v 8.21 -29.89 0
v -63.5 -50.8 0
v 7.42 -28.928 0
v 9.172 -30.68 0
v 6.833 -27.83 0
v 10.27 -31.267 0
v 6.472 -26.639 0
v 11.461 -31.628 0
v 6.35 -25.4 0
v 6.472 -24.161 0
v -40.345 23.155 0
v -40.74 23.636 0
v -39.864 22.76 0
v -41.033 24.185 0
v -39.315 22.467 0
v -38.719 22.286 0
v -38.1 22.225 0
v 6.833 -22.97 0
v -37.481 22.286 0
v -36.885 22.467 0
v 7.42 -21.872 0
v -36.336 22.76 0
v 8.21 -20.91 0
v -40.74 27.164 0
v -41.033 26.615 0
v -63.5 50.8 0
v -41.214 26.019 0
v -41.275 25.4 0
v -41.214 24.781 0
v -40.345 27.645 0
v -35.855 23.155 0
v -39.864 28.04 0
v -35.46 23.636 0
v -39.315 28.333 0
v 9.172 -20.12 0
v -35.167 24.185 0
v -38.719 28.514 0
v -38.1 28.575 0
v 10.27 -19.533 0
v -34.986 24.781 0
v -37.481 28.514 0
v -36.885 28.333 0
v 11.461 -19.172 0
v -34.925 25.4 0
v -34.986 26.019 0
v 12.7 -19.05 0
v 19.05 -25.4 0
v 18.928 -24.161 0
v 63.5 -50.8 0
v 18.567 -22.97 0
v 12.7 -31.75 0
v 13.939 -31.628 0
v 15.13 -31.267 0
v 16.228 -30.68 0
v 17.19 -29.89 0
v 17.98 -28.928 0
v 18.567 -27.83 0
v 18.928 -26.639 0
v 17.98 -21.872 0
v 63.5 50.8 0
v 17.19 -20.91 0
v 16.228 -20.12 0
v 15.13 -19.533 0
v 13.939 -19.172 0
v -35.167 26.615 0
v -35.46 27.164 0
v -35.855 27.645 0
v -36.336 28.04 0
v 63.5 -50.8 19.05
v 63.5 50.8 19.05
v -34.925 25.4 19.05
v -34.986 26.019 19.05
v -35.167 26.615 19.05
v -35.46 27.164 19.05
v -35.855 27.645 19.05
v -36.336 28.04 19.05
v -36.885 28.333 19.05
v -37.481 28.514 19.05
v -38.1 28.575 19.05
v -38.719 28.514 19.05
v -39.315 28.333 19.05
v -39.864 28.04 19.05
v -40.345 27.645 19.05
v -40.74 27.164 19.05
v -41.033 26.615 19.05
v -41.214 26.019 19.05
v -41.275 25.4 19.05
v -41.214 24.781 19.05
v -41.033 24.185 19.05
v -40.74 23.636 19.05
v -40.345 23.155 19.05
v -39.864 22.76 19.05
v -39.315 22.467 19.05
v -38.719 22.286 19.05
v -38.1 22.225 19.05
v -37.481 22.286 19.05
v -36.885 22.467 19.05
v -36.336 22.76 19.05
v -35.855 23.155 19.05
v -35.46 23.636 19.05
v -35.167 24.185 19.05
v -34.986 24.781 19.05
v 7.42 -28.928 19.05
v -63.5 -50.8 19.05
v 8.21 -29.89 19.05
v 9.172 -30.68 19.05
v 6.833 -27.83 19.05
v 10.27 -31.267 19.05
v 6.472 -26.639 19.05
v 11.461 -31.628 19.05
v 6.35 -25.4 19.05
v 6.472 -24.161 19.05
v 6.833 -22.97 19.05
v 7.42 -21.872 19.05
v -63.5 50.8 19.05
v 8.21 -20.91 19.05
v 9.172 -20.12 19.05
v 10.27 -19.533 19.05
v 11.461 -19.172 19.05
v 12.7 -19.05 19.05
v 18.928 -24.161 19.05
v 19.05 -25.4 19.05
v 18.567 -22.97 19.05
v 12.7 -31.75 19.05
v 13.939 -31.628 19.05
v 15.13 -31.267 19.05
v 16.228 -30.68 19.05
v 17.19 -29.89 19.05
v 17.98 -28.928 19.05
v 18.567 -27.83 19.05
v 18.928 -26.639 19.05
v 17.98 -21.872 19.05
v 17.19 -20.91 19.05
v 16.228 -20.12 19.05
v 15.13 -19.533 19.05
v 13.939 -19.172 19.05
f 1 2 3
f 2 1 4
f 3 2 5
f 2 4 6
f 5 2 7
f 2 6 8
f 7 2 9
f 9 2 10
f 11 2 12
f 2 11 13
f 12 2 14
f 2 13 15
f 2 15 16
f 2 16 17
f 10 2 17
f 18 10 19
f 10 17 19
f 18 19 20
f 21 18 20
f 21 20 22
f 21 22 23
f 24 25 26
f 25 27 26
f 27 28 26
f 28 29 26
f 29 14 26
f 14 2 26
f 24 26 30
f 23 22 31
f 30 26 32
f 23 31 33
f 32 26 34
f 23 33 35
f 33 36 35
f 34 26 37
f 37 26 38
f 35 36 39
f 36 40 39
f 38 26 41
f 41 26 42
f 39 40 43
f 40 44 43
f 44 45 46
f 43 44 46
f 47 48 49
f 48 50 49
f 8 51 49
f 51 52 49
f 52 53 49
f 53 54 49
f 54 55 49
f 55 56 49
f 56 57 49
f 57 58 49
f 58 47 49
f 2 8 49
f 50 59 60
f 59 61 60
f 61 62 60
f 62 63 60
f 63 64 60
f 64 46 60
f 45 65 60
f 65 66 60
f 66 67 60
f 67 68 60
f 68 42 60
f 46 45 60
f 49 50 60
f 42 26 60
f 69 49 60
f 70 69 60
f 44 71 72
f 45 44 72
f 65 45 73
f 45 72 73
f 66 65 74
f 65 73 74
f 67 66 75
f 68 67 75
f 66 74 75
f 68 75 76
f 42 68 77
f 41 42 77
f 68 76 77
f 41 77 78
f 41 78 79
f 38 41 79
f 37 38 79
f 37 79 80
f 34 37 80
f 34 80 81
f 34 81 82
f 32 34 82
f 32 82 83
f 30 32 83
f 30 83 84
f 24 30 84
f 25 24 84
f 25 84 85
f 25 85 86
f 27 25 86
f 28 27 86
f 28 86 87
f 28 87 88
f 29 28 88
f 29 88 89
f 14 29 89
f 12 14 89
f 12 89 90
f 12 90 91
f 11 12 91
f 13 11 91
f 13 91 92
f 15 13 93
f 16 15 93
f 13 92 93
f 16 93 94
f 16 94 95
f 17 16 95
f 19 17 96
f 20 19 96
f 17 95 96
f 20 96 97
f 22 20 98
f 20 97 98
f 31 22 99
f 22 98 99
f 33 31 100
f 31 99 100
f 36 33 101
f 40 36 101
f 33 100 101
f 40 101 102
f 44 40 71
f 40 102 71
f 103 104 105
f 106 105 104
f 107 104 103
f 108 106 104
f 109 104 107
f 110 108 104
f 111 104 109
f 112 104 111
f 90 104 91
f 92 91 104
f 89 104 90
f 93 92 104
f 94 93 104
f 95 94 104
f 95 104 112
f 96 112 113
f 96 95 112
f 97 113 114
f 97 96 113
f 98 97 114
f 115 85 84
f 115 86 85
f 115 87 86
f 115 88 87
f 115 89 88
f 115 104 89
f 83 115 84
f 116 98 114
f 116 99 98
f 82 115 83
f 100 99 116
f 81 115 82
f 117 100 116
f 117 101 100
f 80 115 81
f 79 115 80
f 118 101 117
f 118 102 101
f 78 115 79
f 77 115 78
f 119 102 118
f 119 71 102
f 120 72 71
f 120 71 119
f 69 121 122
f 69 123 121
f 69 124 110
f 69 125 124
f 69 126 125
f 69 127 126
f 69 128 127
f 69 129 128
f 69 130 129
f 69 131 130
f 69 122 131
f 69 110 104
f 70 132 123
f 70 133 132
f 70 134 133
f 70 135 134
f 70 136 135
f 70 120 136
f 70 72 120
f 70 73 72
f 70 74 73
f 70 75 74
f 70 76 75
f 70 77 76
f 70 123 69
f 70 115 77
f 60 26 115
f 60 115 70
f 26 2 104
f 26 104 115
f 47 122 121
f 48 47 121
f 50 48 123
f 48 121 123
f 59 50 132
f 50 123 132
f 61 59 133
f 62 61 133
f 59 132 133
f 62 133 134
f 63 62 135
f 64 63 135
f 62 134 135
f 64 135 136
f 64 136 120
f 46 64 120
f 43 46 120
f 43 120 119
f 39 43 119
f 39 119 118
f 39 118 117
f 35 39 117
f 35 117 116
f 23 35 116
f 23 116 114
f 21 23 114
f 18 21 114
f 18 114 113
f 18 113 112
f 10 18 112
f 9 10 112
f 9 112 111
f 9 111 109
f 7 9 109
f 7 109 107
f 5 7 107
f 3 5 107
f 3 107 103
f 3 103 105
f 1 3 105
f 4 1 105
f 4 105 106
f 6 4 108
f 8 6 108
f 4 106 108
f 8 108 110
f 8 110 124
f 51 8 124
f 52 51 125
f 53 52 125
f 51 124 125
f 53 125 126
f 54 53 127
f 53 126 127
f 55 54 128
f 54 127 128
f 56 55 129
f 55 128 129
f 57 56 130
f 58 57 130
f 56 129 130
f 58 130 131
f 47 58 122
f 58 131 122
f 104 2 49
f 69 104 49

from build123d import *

# Parameters (mm, degrees)
F0_W     = 127
F0_H     = 101.6
F1_DEPTH = 19.05
F2_R     = 3.175
F3_DEPTH = 25.4
F4_R     = 6.35
F5_DEPTH = 25.4


with BuildPart() as f1:
    # F0 (on Top) → F1 (new body)
    with BuildSketch(Plane.XY):
        Rectangle(F0_W, F0_H)
    extrude(amount=F1_DEPTH)

    # F2 (on face) → F3 (cut)
    with BuildSketch(Plane.XY.offset(19.05)):
        with Locations((-38.1, 25.4)):
            Circle(F2_R)
    extrude(amount=-F3_DEPTH, mode=Mode.SUBTRACT)

    # F4 (on face) → F5 (cut)
    with BuildSketch(Plane.XY.offset(19.05)):
        with Locations((12.7, -25.4)):
            Circle(F4_R)
    extrude(amount=-F5_DEPTH, mode=Mode.SUBTRACT)


solid = f1.part
